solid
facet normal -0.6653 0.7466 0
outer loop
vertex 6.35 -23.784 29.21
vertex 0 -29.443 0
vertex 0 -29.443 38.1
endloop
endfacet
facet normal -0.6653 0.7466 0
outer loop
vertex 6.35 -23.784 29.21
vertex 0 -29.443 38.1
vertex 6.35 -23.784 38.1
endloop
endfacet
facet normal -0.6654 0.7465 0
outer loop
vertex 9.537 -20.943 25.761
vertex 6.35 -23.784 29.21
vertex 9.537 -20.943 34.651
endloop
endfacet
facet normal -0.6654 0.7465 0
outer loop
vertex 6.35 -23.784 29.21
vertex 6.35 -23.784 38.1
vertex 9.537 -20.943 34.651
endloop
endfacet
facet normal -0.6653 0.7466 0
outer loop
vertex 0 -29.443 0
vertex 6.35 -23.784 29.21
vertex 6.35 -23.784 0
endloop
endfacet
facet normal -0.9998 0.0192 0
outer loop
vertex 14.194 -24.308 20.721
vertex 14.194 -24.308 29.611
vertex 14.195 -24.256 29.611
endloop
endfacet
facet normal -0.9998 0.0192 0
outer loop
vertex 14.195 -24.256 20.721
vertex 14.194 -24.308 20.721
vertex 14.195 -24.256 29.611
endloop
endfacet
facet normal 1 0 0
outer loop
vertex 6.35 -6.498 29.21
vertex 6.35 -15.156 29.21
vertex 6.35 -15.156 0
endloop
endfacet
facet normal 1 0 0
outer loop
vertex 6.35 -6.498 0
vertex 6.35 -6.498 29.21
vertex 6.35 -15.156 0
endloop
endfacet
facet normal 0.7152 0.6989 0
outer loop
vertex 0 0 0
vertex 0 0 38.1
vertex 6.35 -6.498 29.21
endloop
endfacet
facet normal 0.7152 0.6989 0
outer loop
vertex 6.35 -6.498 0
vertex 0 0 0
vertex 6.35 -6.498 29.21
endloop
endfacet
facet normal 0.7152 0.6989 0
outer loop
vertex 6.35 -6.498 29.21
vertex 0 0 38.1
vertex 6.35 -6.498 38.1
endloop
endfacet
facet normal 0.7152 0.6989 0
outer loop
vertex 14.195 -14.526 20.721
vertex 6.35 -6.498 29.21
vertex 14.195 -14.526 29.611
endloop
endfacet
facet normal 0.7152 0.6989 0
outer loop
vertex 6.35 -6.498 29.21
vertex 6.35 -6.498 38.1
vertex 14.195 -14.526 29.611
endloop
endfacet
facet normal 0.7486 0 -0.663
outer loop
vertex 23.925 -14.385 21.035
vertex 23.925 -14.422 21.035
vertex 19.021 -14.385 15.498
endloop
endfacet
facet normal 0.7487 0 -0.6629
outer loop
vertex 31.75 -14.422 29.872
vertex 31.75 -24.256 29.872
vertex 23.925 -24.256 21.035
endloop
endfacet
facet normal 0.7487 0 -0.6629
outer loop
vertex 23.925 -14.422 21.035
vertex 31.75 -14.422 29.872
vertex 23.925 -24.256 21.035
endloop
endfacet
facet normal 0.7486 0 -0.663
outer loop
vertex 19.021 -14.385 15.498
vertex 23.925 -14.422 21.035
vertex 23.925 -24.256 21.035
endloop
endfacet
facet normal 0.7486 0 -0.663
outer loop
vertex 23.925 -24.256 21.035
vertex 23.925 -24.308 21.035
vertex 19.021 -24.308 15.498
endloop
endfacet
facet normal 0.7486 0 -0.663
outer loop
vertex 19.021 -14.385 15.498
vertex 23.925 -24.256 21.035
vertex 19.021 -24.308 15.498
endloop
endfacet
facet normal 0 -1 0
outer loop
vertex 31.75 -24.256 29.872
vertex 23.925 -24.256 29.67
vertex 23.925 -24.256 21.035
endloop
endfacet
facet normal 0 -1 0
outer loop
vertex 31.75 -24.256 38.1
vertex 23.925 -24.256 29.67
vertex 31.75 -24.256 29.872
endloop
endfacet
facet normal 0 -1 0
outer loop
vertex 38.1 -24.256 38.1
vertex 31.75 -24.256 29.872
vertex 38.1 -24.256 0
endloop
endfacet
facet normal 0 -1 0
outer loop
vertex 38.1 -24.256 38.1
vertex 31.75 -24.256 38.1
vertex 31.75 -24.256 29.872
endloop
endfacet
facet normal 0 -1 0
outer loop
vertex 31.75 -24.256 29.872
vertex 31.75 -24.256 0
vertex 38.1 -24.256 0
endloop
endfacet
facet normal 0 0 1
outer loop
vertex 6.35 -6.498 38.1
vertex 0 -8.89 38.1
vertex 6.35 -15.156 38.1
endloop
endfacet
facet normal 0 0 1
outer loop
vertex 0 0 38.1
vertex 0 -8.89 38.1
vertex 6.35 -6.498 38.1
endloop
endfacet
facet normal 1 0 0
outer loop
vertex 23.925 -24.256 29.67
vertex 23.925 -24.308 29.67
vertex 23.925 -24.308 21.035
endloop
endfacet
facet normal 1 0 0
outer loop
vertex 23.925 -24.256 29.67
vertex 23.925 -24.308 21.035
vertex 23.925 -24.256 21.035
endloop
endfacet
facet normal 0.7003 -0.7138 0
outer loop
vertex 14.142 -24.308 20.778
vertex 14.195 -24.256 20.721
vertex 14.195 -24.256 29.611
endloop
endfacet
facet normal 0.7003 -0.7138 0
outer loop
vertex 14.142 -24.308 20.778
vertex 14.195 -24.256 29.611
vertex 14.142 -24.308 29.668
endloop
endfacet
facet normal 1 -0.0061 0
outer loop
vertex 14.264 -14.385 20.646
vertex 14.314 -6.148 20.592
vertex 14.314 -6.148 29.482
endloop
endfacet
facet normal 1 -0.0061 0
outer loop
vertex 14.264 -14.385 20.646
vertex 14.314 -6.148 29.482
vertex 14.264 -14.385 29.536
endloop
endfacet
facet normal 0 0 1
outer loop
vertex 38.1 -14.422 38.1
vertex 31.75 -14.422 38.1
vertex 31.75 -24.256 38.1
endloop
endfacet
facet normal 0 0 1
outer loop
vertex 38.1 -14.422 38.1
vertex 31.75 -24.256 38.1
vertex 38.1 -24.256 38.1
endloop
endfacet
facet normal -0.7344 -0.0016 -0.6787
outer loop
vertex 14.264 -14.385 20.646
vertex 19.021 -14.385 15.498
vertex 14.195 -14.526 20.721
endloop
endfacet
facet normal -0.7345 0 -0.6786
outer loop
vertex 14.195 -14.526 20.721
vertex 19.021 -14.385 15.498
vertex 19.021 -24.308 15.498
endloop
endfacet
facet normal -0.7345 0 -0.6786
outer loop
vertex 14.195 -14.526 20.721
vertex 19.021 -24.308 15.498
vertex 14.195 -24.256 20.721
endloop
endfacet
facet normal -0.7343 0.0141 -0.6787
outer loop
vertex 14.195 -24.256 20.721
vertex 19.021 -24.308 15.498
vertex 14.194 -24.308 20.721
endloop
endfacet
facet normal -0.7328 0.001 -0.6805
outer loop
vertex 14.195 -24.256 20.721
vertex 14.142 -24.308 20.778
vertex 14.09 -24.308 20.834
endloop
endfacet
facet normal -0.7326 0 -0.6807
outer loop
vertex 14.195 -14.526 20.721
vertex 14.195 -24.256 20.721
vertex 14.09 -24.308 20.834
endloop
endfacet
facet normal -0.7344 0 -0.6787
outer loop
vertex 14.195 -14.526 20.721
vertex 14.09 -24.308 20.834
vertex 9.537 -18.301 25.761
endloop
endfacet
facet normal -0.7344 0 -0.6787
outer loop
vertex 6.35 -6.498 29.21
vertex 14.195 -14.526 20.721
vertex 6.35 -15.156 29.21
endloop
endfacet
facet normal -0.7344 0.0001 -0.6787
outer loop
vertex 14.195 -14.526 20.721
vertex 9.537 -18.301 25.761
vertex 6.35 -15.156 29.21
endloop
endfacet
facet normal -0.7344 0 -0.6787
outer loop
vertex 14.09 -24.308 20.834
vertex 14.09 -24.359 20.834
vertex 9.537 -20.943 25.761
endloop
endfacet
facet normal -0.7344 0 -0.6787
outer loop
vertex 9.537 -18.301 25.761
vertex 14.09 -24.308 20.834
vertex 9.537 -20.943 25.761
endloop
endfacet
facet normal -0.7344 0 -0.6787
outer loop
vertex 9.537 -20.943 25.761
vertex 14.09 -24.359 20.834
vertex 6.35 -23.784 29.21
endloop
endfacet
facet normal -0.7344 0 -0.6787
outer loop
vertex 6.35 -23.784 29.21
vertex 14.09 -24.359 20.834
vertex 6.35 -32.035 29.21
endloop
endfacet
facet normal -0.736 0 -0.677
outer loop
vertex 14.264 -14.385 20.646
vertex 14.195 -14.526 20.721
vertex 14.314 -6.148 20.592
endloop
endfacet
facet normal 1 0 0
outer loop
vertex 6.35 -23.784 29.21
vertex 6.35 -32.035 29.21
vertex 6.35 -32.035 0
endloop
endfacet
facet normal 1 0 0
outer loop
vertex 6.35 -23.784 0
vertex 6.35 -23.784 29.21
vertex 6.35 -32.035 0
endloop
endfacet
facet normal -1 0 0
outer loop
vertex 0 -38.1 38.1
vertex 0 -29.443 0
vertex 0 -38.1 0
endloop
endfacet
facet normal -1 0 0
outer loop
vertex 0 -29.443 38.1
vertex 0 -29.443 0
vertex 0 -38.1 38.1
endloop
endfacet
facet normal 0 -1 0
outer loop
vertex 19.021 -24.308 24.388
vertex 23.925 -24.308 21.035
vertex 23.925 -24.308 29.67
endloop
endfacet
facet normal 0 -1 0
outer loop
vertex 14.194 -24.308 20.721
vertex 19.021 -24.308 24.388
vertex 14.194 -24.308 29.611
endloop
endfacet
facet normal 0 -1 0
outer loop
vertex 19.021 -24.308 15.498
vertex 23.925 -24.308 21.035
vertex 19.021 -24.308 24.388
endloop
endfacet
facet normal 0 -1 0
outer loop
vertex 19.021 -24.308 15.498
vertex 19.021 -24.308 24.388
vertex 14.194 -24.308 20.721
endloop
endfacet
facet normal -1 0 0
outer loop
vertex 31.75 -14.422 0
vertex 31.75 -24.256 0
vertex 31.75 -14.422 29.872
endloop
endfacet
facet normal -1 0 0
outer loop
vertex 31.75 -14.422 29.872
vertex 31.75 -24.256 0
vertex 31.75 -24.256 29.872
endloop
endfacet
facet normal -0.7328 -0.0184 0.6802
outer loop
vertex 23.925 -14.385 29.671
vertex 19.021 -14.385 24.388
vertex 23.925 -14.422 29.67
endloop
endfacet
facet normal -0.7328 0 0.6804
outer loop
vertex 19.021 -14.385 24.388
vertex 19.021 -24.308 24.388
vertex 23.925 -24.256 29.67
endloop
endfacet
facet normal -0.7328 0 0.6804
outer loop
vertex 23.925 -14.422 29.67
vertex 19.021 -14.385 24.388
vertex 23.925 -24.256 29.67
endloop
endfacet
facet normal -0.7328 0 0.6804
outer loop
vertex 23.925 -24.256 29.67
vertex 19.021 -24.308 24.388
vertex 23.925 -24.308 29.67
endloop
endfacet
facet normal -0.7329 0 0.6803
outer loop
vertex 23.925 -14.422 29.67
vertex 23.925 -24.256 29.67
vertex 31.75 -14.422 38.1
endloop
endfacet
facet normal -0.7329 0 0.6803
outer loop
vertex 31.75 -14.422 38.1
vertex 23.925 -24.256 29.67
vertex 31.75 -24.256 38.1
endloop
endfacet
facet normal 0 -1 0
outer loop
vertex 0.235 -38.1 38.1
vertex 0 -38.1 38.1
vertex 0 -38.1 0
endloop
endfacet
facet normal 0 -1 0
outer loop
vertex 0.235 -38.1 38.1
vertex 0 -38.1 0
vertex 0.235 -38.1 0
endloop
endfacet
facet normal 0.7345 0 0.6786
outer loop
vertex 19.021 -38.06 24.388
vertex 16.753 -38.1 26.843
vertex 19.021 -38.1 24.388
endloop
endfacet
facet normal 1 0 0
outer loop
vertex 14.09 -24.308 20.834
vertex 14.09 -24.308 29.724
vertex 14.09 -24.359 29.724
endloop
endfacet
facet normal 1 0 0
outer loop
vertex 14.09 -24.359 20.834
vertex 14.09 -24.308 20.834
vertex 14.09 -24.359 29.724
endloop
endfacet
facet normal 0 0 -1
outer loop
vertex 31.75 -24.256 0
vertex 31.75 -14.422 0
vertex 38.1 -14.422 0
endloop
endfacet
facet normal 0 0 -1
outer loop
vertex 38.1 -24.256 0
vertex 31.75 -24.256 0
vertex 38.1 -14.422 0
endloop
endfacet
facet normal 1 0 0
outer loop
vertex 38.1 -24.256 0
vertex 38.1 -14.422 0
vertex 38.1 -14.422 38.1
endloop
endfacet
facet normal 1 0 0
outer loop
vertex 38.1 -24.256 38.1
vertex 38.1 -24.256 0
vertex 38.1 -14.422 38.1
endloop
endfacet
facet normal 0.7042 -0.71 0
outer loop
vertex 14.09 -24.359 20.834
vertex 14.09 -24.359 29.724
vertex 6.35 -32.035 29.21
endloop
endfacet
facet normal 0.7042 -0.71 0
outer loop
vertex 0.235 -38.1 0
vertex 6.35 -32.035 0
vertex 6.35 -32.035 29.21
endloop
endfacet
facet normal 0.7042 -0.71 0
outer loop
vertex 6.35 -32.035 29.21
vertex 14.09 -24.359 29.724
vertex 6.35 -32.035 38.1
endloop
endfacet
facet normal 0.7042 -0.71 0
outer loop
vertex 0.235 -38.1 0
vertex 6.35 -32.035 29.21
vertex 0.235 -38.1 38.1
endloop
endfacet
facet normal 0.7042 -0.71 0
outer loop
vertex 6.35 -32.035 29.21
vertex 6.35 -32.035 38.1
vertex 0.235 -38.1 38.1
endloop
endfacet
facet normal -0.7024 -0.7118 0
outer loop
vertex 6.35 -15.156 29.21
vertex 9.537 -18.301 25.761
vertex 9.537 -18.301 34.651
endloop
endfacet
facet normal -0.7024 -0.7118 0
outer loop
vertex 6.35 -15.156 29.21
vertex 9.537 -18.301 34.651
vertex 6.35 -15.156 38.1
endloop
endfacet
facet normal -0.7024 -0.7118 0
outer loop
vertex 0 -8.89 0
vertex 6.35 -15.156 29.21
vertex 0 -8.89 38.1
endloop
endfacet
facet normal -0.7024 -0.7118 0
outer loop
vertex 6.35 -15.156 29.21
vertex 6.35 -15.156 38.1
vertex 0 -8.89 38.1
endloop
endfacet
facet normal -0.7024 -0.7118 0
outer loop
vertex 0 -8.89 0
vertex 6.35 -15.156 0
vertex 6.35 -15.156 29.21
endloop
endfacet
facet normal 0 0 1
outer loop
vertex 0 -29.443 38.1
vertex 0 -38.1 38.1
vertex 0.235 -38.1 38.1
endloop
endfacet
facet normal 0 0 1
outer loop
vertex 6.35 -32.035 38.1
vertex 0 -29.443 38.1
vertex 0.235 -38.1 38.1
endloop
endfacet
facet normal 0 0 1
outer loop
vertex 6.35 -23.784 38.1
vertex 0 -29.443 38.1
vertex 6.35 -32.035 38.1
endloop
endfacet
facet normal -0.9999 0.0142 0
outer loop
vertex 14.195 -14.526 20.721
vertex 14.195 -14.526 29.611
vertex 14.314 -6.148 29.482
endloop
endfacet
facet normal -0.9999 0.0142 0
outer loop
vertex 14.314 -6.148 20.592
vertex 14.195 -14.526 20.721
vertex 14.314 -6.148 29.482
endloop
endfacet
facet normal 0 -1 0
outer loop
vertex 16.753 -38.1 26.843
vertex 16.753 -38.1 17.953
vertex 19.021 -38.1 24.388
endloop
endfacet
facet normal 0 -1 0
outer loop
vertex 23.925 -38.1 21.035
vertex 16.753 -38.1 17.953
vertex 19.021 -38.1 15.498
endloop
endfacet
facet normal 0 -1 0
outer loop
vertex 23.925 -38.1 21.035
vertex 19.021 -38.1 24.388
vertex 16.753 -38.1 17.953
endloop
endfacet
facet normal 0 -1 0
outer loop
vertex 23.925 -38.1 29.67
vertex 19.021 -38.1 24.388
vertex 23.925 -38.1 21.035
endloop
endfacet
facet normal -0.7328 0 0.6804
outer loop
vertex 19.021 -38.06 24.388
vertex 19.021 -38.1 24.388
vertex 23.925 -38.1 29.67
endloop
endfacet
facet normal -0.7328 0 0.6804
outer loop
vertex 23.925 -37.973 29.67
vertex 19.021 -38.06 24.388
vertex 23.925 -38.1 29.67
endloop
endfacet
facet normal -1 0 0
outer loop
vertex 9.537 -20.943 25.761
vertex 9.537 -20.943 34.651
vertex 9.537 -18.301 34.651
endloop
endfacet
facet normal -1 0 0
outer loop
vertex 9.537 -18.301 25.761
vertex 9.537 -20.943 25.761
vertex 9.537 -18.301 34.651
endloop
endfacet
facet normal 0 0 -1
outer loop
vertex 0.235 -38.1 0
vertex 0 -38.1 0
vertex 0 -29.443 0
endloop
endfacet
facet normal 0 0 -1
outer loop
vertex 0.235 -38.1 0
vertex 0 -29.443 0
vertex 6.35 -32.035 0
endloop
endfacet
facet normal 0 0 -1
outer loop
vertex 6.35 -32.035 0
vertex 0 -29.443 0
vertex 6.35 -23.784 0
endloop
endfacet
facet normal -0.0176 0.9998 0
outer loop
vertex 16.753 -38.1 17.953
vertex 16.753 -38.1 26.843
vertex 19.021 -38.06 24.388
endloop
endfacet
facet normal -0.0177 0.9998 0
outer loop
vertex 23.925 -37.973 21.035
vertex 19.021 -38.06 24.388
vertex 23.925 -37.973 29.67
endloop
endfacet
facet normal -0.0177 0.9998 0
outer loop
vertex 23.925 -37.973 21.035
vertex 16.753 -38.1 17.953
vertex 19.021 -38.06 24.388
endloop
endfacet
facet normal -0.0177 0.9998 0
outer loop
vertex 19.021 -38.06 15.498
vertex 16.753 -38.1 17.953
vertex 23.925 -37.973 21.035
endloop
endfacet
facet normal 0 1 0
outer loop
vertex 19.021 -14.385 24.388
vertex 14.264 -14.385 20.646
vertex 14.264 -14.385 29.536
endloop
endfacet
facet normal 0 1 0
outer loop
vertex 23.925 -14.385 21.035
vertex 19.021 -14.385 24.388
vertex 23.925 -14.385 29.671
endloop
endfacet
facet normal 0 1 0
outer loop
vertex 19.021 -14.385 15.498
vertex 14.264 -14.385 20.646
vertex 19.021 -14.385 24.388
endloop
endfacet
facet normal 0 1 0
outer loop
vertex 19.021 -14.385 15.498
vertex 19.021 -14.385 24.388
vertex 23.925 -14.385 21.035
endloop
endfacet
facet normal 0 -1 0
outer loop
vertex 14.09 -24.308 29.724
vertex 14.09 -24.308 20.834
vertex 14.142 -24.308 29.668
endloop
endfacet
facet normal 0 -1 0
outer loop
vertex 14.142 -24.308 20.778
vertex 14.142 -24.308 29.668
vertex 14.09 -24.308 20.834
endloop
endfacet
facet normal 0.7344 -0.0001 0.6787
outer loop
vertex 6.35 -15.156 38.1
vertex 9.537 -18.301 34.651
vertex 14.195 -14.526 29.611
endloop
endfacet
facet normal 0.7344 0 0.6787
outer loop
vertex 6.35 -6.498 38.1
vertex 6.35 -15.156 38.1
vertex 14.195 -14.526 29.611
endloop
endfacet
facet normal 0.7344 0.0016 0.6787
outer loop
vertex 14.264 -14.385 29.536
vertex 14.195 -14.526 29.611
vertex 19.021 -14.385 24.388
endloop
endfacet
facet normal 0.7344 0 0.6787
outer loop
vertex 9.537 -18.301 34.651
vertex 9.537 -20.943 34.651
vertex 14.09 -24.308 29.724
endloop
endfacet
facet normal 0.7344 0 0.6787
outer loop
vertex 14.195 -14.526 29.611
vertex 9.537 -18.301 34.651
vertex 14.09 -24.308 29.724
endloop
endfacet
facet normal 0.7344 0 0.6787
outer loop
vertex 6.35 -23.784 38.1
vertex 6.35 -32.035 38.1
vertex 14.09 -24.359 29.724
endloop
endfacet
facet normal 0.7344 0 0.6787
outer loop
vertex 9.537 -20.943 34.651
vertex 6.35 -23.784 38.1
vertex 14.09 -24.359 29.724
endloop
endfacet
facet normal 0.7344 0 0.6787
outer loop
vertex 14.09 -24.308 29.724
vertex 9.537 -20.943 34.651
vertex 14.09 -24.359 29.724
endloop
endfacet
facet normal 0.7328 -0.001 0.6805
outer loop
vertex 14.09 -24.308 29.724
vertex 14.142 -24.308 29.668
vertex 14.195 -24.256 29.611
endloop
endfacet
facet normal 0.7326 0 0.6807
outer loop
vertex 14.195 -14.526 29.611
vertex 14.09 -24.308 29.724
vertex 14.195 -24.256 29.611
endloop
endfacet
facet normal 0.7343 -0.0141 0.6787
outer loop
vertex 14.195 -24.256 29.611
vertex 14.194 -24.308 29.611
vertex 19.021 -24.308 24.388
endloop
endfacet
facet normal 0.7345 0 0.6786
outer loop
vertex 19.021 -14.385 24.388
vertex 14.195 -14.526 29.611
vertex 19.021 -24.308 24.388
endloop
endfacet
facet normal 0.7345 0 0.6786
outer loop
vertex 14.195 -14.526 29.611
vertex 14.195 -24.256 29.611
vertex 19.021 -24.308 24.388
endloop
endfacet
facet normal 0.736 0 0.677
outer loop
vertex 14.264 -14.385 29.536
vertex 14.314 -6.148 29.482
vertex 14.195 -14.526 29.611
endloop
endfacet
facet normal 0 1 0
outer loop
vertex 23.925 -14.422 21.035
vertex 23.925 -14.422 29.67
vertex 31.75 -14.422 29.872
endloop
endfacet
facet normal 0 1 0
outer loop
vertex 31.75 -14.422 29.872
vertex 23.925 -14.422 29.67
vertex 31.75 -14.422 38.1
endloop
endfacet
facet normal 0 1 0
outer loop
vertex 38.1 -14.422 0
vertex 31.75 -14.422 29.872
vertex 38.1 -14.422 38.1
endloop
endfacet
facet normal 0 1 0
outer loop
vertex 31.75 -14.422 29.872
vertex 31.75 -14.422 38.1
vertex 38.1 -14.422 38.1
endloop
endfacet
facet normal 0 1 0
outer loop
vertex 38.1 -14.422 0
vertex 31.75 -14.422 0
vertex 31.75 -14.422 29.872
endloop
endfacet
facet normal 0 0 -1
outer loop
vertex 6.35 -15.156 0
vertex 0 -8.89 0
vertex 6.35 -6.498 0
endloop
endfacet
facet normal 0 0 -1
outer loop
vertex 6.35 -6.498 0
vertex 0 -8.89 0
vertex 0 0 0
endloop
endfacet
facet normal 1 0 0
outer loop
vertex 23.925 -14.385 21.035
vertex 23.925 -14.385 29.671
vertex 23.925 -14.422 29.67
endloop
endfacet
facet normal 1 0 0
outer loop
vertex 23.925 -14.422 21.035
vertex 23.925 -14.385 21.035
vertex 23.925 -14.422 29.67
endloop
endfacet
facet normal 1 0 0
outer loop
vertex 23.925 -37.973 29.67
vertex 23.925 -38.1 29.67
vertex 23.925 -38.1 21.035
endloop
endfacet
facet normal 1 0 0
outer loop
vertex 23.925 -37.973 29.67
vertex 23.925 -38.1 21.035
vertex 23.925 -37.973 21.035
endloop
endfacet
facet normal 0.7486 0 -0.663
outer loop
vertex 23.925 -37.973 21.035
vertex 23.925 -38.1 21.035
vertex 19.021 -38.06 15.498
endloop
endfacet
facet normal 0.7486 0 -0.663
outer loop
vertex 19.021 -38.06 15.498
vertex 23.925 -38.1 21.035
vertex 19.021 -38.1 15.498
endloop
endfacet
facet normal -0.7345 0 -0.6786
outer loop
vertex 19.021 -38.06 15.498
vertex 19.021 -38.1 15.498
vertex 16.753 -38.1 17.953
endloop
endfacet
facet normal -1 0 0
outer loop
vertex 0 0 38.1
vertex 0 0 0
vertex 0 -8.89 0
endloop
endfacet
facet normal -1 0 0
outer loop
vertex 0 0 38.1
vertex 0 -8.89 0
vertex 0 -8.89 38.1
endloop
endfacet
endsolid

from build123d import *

# Parameters (mm, degrees)
F0_W     = 38.1
F0_H     = 38.1
F1_DEPTH = 38.1
F3_DEPTH = 38.1
F4_DEPTH = 38.1
F6_W     = 14.284089
F6_H     = 13.870054
F7_DEPTH = 38.1
F9_DEPTH = 38.1


with BuildPart() as f1:
    # F0 (on Front) → F1 (new body)
    with BuildSketch(Plane.XZ):
        with Locations((19.05, 19.05)):
            Rectangle(F0_W, F0_H)
    extrude(amount=F1_DEPTH)

    # F2 (on face) → F3 (cut)
    with BuildSketch(Plane.XZ.offset(38.1)):
        Polygon((31.75, 38.1), (6.35, 38.1), (19.021031, 24.38806), align=None)
    extrude(amount=-F3_DEPTH, mode=Mode.SUBTRACT)

    # F2 (on face) → F4 (cut)
    with BuildSketch(Plane.XZ.offset(38.1)):
        Polygon((19.021031, 15.49806), (6.35, 29.21), (6.35, 0), (31.75, 0), (31.75, 29.871542), align=None)
    extrude(amount=-F4_DEPTH, mode=Mode.SUBTRACT)

    # F6 (on offset) → F7 (cut)
    with BuildSketch(Plane.XY.offset(38.1)):
        with Locations((31.066571, -31.190644)):
            Rectangle(F6_W, F6_H)
        Polygon((24.028033, 0), (23.924526, -14.422366), (38.208615, -14.422366), (38.208615, 0), align=None)
        Polygon((0, 0), (14.194785, -14.525875), (14.401801, 0), align=None)
        Polygon((0, -8.89), (0, -29.44269), (9.536929, -20.943364), (9.536929, -18.301016), align=None)
        Polygon((14.194785, -24.255617), (0, -38.33269), (14.091277, -38.33269), (14.099041, -37.276795), align=None)
    extrude(amount=-F7_DEPTH, mode=Mode.SUBTRACT)

    # F8 (on Top) → F9 (cut)
    with BuildSketch(Plane.XY):
        Polygon((14.351379, 0), (14.26434, -14.385366), (24.099793, -14.385366), (24.099793, 0), align=None)
        Polygon((14.09026, -24.307858), (14.09026, -38.147125), (23.925714, -37.973043), (23.925714, -24.307858), align=None)
    extrude(amount=F9_DEPTH, mode=Mode.SUBTRACT)


solid = f1.part
